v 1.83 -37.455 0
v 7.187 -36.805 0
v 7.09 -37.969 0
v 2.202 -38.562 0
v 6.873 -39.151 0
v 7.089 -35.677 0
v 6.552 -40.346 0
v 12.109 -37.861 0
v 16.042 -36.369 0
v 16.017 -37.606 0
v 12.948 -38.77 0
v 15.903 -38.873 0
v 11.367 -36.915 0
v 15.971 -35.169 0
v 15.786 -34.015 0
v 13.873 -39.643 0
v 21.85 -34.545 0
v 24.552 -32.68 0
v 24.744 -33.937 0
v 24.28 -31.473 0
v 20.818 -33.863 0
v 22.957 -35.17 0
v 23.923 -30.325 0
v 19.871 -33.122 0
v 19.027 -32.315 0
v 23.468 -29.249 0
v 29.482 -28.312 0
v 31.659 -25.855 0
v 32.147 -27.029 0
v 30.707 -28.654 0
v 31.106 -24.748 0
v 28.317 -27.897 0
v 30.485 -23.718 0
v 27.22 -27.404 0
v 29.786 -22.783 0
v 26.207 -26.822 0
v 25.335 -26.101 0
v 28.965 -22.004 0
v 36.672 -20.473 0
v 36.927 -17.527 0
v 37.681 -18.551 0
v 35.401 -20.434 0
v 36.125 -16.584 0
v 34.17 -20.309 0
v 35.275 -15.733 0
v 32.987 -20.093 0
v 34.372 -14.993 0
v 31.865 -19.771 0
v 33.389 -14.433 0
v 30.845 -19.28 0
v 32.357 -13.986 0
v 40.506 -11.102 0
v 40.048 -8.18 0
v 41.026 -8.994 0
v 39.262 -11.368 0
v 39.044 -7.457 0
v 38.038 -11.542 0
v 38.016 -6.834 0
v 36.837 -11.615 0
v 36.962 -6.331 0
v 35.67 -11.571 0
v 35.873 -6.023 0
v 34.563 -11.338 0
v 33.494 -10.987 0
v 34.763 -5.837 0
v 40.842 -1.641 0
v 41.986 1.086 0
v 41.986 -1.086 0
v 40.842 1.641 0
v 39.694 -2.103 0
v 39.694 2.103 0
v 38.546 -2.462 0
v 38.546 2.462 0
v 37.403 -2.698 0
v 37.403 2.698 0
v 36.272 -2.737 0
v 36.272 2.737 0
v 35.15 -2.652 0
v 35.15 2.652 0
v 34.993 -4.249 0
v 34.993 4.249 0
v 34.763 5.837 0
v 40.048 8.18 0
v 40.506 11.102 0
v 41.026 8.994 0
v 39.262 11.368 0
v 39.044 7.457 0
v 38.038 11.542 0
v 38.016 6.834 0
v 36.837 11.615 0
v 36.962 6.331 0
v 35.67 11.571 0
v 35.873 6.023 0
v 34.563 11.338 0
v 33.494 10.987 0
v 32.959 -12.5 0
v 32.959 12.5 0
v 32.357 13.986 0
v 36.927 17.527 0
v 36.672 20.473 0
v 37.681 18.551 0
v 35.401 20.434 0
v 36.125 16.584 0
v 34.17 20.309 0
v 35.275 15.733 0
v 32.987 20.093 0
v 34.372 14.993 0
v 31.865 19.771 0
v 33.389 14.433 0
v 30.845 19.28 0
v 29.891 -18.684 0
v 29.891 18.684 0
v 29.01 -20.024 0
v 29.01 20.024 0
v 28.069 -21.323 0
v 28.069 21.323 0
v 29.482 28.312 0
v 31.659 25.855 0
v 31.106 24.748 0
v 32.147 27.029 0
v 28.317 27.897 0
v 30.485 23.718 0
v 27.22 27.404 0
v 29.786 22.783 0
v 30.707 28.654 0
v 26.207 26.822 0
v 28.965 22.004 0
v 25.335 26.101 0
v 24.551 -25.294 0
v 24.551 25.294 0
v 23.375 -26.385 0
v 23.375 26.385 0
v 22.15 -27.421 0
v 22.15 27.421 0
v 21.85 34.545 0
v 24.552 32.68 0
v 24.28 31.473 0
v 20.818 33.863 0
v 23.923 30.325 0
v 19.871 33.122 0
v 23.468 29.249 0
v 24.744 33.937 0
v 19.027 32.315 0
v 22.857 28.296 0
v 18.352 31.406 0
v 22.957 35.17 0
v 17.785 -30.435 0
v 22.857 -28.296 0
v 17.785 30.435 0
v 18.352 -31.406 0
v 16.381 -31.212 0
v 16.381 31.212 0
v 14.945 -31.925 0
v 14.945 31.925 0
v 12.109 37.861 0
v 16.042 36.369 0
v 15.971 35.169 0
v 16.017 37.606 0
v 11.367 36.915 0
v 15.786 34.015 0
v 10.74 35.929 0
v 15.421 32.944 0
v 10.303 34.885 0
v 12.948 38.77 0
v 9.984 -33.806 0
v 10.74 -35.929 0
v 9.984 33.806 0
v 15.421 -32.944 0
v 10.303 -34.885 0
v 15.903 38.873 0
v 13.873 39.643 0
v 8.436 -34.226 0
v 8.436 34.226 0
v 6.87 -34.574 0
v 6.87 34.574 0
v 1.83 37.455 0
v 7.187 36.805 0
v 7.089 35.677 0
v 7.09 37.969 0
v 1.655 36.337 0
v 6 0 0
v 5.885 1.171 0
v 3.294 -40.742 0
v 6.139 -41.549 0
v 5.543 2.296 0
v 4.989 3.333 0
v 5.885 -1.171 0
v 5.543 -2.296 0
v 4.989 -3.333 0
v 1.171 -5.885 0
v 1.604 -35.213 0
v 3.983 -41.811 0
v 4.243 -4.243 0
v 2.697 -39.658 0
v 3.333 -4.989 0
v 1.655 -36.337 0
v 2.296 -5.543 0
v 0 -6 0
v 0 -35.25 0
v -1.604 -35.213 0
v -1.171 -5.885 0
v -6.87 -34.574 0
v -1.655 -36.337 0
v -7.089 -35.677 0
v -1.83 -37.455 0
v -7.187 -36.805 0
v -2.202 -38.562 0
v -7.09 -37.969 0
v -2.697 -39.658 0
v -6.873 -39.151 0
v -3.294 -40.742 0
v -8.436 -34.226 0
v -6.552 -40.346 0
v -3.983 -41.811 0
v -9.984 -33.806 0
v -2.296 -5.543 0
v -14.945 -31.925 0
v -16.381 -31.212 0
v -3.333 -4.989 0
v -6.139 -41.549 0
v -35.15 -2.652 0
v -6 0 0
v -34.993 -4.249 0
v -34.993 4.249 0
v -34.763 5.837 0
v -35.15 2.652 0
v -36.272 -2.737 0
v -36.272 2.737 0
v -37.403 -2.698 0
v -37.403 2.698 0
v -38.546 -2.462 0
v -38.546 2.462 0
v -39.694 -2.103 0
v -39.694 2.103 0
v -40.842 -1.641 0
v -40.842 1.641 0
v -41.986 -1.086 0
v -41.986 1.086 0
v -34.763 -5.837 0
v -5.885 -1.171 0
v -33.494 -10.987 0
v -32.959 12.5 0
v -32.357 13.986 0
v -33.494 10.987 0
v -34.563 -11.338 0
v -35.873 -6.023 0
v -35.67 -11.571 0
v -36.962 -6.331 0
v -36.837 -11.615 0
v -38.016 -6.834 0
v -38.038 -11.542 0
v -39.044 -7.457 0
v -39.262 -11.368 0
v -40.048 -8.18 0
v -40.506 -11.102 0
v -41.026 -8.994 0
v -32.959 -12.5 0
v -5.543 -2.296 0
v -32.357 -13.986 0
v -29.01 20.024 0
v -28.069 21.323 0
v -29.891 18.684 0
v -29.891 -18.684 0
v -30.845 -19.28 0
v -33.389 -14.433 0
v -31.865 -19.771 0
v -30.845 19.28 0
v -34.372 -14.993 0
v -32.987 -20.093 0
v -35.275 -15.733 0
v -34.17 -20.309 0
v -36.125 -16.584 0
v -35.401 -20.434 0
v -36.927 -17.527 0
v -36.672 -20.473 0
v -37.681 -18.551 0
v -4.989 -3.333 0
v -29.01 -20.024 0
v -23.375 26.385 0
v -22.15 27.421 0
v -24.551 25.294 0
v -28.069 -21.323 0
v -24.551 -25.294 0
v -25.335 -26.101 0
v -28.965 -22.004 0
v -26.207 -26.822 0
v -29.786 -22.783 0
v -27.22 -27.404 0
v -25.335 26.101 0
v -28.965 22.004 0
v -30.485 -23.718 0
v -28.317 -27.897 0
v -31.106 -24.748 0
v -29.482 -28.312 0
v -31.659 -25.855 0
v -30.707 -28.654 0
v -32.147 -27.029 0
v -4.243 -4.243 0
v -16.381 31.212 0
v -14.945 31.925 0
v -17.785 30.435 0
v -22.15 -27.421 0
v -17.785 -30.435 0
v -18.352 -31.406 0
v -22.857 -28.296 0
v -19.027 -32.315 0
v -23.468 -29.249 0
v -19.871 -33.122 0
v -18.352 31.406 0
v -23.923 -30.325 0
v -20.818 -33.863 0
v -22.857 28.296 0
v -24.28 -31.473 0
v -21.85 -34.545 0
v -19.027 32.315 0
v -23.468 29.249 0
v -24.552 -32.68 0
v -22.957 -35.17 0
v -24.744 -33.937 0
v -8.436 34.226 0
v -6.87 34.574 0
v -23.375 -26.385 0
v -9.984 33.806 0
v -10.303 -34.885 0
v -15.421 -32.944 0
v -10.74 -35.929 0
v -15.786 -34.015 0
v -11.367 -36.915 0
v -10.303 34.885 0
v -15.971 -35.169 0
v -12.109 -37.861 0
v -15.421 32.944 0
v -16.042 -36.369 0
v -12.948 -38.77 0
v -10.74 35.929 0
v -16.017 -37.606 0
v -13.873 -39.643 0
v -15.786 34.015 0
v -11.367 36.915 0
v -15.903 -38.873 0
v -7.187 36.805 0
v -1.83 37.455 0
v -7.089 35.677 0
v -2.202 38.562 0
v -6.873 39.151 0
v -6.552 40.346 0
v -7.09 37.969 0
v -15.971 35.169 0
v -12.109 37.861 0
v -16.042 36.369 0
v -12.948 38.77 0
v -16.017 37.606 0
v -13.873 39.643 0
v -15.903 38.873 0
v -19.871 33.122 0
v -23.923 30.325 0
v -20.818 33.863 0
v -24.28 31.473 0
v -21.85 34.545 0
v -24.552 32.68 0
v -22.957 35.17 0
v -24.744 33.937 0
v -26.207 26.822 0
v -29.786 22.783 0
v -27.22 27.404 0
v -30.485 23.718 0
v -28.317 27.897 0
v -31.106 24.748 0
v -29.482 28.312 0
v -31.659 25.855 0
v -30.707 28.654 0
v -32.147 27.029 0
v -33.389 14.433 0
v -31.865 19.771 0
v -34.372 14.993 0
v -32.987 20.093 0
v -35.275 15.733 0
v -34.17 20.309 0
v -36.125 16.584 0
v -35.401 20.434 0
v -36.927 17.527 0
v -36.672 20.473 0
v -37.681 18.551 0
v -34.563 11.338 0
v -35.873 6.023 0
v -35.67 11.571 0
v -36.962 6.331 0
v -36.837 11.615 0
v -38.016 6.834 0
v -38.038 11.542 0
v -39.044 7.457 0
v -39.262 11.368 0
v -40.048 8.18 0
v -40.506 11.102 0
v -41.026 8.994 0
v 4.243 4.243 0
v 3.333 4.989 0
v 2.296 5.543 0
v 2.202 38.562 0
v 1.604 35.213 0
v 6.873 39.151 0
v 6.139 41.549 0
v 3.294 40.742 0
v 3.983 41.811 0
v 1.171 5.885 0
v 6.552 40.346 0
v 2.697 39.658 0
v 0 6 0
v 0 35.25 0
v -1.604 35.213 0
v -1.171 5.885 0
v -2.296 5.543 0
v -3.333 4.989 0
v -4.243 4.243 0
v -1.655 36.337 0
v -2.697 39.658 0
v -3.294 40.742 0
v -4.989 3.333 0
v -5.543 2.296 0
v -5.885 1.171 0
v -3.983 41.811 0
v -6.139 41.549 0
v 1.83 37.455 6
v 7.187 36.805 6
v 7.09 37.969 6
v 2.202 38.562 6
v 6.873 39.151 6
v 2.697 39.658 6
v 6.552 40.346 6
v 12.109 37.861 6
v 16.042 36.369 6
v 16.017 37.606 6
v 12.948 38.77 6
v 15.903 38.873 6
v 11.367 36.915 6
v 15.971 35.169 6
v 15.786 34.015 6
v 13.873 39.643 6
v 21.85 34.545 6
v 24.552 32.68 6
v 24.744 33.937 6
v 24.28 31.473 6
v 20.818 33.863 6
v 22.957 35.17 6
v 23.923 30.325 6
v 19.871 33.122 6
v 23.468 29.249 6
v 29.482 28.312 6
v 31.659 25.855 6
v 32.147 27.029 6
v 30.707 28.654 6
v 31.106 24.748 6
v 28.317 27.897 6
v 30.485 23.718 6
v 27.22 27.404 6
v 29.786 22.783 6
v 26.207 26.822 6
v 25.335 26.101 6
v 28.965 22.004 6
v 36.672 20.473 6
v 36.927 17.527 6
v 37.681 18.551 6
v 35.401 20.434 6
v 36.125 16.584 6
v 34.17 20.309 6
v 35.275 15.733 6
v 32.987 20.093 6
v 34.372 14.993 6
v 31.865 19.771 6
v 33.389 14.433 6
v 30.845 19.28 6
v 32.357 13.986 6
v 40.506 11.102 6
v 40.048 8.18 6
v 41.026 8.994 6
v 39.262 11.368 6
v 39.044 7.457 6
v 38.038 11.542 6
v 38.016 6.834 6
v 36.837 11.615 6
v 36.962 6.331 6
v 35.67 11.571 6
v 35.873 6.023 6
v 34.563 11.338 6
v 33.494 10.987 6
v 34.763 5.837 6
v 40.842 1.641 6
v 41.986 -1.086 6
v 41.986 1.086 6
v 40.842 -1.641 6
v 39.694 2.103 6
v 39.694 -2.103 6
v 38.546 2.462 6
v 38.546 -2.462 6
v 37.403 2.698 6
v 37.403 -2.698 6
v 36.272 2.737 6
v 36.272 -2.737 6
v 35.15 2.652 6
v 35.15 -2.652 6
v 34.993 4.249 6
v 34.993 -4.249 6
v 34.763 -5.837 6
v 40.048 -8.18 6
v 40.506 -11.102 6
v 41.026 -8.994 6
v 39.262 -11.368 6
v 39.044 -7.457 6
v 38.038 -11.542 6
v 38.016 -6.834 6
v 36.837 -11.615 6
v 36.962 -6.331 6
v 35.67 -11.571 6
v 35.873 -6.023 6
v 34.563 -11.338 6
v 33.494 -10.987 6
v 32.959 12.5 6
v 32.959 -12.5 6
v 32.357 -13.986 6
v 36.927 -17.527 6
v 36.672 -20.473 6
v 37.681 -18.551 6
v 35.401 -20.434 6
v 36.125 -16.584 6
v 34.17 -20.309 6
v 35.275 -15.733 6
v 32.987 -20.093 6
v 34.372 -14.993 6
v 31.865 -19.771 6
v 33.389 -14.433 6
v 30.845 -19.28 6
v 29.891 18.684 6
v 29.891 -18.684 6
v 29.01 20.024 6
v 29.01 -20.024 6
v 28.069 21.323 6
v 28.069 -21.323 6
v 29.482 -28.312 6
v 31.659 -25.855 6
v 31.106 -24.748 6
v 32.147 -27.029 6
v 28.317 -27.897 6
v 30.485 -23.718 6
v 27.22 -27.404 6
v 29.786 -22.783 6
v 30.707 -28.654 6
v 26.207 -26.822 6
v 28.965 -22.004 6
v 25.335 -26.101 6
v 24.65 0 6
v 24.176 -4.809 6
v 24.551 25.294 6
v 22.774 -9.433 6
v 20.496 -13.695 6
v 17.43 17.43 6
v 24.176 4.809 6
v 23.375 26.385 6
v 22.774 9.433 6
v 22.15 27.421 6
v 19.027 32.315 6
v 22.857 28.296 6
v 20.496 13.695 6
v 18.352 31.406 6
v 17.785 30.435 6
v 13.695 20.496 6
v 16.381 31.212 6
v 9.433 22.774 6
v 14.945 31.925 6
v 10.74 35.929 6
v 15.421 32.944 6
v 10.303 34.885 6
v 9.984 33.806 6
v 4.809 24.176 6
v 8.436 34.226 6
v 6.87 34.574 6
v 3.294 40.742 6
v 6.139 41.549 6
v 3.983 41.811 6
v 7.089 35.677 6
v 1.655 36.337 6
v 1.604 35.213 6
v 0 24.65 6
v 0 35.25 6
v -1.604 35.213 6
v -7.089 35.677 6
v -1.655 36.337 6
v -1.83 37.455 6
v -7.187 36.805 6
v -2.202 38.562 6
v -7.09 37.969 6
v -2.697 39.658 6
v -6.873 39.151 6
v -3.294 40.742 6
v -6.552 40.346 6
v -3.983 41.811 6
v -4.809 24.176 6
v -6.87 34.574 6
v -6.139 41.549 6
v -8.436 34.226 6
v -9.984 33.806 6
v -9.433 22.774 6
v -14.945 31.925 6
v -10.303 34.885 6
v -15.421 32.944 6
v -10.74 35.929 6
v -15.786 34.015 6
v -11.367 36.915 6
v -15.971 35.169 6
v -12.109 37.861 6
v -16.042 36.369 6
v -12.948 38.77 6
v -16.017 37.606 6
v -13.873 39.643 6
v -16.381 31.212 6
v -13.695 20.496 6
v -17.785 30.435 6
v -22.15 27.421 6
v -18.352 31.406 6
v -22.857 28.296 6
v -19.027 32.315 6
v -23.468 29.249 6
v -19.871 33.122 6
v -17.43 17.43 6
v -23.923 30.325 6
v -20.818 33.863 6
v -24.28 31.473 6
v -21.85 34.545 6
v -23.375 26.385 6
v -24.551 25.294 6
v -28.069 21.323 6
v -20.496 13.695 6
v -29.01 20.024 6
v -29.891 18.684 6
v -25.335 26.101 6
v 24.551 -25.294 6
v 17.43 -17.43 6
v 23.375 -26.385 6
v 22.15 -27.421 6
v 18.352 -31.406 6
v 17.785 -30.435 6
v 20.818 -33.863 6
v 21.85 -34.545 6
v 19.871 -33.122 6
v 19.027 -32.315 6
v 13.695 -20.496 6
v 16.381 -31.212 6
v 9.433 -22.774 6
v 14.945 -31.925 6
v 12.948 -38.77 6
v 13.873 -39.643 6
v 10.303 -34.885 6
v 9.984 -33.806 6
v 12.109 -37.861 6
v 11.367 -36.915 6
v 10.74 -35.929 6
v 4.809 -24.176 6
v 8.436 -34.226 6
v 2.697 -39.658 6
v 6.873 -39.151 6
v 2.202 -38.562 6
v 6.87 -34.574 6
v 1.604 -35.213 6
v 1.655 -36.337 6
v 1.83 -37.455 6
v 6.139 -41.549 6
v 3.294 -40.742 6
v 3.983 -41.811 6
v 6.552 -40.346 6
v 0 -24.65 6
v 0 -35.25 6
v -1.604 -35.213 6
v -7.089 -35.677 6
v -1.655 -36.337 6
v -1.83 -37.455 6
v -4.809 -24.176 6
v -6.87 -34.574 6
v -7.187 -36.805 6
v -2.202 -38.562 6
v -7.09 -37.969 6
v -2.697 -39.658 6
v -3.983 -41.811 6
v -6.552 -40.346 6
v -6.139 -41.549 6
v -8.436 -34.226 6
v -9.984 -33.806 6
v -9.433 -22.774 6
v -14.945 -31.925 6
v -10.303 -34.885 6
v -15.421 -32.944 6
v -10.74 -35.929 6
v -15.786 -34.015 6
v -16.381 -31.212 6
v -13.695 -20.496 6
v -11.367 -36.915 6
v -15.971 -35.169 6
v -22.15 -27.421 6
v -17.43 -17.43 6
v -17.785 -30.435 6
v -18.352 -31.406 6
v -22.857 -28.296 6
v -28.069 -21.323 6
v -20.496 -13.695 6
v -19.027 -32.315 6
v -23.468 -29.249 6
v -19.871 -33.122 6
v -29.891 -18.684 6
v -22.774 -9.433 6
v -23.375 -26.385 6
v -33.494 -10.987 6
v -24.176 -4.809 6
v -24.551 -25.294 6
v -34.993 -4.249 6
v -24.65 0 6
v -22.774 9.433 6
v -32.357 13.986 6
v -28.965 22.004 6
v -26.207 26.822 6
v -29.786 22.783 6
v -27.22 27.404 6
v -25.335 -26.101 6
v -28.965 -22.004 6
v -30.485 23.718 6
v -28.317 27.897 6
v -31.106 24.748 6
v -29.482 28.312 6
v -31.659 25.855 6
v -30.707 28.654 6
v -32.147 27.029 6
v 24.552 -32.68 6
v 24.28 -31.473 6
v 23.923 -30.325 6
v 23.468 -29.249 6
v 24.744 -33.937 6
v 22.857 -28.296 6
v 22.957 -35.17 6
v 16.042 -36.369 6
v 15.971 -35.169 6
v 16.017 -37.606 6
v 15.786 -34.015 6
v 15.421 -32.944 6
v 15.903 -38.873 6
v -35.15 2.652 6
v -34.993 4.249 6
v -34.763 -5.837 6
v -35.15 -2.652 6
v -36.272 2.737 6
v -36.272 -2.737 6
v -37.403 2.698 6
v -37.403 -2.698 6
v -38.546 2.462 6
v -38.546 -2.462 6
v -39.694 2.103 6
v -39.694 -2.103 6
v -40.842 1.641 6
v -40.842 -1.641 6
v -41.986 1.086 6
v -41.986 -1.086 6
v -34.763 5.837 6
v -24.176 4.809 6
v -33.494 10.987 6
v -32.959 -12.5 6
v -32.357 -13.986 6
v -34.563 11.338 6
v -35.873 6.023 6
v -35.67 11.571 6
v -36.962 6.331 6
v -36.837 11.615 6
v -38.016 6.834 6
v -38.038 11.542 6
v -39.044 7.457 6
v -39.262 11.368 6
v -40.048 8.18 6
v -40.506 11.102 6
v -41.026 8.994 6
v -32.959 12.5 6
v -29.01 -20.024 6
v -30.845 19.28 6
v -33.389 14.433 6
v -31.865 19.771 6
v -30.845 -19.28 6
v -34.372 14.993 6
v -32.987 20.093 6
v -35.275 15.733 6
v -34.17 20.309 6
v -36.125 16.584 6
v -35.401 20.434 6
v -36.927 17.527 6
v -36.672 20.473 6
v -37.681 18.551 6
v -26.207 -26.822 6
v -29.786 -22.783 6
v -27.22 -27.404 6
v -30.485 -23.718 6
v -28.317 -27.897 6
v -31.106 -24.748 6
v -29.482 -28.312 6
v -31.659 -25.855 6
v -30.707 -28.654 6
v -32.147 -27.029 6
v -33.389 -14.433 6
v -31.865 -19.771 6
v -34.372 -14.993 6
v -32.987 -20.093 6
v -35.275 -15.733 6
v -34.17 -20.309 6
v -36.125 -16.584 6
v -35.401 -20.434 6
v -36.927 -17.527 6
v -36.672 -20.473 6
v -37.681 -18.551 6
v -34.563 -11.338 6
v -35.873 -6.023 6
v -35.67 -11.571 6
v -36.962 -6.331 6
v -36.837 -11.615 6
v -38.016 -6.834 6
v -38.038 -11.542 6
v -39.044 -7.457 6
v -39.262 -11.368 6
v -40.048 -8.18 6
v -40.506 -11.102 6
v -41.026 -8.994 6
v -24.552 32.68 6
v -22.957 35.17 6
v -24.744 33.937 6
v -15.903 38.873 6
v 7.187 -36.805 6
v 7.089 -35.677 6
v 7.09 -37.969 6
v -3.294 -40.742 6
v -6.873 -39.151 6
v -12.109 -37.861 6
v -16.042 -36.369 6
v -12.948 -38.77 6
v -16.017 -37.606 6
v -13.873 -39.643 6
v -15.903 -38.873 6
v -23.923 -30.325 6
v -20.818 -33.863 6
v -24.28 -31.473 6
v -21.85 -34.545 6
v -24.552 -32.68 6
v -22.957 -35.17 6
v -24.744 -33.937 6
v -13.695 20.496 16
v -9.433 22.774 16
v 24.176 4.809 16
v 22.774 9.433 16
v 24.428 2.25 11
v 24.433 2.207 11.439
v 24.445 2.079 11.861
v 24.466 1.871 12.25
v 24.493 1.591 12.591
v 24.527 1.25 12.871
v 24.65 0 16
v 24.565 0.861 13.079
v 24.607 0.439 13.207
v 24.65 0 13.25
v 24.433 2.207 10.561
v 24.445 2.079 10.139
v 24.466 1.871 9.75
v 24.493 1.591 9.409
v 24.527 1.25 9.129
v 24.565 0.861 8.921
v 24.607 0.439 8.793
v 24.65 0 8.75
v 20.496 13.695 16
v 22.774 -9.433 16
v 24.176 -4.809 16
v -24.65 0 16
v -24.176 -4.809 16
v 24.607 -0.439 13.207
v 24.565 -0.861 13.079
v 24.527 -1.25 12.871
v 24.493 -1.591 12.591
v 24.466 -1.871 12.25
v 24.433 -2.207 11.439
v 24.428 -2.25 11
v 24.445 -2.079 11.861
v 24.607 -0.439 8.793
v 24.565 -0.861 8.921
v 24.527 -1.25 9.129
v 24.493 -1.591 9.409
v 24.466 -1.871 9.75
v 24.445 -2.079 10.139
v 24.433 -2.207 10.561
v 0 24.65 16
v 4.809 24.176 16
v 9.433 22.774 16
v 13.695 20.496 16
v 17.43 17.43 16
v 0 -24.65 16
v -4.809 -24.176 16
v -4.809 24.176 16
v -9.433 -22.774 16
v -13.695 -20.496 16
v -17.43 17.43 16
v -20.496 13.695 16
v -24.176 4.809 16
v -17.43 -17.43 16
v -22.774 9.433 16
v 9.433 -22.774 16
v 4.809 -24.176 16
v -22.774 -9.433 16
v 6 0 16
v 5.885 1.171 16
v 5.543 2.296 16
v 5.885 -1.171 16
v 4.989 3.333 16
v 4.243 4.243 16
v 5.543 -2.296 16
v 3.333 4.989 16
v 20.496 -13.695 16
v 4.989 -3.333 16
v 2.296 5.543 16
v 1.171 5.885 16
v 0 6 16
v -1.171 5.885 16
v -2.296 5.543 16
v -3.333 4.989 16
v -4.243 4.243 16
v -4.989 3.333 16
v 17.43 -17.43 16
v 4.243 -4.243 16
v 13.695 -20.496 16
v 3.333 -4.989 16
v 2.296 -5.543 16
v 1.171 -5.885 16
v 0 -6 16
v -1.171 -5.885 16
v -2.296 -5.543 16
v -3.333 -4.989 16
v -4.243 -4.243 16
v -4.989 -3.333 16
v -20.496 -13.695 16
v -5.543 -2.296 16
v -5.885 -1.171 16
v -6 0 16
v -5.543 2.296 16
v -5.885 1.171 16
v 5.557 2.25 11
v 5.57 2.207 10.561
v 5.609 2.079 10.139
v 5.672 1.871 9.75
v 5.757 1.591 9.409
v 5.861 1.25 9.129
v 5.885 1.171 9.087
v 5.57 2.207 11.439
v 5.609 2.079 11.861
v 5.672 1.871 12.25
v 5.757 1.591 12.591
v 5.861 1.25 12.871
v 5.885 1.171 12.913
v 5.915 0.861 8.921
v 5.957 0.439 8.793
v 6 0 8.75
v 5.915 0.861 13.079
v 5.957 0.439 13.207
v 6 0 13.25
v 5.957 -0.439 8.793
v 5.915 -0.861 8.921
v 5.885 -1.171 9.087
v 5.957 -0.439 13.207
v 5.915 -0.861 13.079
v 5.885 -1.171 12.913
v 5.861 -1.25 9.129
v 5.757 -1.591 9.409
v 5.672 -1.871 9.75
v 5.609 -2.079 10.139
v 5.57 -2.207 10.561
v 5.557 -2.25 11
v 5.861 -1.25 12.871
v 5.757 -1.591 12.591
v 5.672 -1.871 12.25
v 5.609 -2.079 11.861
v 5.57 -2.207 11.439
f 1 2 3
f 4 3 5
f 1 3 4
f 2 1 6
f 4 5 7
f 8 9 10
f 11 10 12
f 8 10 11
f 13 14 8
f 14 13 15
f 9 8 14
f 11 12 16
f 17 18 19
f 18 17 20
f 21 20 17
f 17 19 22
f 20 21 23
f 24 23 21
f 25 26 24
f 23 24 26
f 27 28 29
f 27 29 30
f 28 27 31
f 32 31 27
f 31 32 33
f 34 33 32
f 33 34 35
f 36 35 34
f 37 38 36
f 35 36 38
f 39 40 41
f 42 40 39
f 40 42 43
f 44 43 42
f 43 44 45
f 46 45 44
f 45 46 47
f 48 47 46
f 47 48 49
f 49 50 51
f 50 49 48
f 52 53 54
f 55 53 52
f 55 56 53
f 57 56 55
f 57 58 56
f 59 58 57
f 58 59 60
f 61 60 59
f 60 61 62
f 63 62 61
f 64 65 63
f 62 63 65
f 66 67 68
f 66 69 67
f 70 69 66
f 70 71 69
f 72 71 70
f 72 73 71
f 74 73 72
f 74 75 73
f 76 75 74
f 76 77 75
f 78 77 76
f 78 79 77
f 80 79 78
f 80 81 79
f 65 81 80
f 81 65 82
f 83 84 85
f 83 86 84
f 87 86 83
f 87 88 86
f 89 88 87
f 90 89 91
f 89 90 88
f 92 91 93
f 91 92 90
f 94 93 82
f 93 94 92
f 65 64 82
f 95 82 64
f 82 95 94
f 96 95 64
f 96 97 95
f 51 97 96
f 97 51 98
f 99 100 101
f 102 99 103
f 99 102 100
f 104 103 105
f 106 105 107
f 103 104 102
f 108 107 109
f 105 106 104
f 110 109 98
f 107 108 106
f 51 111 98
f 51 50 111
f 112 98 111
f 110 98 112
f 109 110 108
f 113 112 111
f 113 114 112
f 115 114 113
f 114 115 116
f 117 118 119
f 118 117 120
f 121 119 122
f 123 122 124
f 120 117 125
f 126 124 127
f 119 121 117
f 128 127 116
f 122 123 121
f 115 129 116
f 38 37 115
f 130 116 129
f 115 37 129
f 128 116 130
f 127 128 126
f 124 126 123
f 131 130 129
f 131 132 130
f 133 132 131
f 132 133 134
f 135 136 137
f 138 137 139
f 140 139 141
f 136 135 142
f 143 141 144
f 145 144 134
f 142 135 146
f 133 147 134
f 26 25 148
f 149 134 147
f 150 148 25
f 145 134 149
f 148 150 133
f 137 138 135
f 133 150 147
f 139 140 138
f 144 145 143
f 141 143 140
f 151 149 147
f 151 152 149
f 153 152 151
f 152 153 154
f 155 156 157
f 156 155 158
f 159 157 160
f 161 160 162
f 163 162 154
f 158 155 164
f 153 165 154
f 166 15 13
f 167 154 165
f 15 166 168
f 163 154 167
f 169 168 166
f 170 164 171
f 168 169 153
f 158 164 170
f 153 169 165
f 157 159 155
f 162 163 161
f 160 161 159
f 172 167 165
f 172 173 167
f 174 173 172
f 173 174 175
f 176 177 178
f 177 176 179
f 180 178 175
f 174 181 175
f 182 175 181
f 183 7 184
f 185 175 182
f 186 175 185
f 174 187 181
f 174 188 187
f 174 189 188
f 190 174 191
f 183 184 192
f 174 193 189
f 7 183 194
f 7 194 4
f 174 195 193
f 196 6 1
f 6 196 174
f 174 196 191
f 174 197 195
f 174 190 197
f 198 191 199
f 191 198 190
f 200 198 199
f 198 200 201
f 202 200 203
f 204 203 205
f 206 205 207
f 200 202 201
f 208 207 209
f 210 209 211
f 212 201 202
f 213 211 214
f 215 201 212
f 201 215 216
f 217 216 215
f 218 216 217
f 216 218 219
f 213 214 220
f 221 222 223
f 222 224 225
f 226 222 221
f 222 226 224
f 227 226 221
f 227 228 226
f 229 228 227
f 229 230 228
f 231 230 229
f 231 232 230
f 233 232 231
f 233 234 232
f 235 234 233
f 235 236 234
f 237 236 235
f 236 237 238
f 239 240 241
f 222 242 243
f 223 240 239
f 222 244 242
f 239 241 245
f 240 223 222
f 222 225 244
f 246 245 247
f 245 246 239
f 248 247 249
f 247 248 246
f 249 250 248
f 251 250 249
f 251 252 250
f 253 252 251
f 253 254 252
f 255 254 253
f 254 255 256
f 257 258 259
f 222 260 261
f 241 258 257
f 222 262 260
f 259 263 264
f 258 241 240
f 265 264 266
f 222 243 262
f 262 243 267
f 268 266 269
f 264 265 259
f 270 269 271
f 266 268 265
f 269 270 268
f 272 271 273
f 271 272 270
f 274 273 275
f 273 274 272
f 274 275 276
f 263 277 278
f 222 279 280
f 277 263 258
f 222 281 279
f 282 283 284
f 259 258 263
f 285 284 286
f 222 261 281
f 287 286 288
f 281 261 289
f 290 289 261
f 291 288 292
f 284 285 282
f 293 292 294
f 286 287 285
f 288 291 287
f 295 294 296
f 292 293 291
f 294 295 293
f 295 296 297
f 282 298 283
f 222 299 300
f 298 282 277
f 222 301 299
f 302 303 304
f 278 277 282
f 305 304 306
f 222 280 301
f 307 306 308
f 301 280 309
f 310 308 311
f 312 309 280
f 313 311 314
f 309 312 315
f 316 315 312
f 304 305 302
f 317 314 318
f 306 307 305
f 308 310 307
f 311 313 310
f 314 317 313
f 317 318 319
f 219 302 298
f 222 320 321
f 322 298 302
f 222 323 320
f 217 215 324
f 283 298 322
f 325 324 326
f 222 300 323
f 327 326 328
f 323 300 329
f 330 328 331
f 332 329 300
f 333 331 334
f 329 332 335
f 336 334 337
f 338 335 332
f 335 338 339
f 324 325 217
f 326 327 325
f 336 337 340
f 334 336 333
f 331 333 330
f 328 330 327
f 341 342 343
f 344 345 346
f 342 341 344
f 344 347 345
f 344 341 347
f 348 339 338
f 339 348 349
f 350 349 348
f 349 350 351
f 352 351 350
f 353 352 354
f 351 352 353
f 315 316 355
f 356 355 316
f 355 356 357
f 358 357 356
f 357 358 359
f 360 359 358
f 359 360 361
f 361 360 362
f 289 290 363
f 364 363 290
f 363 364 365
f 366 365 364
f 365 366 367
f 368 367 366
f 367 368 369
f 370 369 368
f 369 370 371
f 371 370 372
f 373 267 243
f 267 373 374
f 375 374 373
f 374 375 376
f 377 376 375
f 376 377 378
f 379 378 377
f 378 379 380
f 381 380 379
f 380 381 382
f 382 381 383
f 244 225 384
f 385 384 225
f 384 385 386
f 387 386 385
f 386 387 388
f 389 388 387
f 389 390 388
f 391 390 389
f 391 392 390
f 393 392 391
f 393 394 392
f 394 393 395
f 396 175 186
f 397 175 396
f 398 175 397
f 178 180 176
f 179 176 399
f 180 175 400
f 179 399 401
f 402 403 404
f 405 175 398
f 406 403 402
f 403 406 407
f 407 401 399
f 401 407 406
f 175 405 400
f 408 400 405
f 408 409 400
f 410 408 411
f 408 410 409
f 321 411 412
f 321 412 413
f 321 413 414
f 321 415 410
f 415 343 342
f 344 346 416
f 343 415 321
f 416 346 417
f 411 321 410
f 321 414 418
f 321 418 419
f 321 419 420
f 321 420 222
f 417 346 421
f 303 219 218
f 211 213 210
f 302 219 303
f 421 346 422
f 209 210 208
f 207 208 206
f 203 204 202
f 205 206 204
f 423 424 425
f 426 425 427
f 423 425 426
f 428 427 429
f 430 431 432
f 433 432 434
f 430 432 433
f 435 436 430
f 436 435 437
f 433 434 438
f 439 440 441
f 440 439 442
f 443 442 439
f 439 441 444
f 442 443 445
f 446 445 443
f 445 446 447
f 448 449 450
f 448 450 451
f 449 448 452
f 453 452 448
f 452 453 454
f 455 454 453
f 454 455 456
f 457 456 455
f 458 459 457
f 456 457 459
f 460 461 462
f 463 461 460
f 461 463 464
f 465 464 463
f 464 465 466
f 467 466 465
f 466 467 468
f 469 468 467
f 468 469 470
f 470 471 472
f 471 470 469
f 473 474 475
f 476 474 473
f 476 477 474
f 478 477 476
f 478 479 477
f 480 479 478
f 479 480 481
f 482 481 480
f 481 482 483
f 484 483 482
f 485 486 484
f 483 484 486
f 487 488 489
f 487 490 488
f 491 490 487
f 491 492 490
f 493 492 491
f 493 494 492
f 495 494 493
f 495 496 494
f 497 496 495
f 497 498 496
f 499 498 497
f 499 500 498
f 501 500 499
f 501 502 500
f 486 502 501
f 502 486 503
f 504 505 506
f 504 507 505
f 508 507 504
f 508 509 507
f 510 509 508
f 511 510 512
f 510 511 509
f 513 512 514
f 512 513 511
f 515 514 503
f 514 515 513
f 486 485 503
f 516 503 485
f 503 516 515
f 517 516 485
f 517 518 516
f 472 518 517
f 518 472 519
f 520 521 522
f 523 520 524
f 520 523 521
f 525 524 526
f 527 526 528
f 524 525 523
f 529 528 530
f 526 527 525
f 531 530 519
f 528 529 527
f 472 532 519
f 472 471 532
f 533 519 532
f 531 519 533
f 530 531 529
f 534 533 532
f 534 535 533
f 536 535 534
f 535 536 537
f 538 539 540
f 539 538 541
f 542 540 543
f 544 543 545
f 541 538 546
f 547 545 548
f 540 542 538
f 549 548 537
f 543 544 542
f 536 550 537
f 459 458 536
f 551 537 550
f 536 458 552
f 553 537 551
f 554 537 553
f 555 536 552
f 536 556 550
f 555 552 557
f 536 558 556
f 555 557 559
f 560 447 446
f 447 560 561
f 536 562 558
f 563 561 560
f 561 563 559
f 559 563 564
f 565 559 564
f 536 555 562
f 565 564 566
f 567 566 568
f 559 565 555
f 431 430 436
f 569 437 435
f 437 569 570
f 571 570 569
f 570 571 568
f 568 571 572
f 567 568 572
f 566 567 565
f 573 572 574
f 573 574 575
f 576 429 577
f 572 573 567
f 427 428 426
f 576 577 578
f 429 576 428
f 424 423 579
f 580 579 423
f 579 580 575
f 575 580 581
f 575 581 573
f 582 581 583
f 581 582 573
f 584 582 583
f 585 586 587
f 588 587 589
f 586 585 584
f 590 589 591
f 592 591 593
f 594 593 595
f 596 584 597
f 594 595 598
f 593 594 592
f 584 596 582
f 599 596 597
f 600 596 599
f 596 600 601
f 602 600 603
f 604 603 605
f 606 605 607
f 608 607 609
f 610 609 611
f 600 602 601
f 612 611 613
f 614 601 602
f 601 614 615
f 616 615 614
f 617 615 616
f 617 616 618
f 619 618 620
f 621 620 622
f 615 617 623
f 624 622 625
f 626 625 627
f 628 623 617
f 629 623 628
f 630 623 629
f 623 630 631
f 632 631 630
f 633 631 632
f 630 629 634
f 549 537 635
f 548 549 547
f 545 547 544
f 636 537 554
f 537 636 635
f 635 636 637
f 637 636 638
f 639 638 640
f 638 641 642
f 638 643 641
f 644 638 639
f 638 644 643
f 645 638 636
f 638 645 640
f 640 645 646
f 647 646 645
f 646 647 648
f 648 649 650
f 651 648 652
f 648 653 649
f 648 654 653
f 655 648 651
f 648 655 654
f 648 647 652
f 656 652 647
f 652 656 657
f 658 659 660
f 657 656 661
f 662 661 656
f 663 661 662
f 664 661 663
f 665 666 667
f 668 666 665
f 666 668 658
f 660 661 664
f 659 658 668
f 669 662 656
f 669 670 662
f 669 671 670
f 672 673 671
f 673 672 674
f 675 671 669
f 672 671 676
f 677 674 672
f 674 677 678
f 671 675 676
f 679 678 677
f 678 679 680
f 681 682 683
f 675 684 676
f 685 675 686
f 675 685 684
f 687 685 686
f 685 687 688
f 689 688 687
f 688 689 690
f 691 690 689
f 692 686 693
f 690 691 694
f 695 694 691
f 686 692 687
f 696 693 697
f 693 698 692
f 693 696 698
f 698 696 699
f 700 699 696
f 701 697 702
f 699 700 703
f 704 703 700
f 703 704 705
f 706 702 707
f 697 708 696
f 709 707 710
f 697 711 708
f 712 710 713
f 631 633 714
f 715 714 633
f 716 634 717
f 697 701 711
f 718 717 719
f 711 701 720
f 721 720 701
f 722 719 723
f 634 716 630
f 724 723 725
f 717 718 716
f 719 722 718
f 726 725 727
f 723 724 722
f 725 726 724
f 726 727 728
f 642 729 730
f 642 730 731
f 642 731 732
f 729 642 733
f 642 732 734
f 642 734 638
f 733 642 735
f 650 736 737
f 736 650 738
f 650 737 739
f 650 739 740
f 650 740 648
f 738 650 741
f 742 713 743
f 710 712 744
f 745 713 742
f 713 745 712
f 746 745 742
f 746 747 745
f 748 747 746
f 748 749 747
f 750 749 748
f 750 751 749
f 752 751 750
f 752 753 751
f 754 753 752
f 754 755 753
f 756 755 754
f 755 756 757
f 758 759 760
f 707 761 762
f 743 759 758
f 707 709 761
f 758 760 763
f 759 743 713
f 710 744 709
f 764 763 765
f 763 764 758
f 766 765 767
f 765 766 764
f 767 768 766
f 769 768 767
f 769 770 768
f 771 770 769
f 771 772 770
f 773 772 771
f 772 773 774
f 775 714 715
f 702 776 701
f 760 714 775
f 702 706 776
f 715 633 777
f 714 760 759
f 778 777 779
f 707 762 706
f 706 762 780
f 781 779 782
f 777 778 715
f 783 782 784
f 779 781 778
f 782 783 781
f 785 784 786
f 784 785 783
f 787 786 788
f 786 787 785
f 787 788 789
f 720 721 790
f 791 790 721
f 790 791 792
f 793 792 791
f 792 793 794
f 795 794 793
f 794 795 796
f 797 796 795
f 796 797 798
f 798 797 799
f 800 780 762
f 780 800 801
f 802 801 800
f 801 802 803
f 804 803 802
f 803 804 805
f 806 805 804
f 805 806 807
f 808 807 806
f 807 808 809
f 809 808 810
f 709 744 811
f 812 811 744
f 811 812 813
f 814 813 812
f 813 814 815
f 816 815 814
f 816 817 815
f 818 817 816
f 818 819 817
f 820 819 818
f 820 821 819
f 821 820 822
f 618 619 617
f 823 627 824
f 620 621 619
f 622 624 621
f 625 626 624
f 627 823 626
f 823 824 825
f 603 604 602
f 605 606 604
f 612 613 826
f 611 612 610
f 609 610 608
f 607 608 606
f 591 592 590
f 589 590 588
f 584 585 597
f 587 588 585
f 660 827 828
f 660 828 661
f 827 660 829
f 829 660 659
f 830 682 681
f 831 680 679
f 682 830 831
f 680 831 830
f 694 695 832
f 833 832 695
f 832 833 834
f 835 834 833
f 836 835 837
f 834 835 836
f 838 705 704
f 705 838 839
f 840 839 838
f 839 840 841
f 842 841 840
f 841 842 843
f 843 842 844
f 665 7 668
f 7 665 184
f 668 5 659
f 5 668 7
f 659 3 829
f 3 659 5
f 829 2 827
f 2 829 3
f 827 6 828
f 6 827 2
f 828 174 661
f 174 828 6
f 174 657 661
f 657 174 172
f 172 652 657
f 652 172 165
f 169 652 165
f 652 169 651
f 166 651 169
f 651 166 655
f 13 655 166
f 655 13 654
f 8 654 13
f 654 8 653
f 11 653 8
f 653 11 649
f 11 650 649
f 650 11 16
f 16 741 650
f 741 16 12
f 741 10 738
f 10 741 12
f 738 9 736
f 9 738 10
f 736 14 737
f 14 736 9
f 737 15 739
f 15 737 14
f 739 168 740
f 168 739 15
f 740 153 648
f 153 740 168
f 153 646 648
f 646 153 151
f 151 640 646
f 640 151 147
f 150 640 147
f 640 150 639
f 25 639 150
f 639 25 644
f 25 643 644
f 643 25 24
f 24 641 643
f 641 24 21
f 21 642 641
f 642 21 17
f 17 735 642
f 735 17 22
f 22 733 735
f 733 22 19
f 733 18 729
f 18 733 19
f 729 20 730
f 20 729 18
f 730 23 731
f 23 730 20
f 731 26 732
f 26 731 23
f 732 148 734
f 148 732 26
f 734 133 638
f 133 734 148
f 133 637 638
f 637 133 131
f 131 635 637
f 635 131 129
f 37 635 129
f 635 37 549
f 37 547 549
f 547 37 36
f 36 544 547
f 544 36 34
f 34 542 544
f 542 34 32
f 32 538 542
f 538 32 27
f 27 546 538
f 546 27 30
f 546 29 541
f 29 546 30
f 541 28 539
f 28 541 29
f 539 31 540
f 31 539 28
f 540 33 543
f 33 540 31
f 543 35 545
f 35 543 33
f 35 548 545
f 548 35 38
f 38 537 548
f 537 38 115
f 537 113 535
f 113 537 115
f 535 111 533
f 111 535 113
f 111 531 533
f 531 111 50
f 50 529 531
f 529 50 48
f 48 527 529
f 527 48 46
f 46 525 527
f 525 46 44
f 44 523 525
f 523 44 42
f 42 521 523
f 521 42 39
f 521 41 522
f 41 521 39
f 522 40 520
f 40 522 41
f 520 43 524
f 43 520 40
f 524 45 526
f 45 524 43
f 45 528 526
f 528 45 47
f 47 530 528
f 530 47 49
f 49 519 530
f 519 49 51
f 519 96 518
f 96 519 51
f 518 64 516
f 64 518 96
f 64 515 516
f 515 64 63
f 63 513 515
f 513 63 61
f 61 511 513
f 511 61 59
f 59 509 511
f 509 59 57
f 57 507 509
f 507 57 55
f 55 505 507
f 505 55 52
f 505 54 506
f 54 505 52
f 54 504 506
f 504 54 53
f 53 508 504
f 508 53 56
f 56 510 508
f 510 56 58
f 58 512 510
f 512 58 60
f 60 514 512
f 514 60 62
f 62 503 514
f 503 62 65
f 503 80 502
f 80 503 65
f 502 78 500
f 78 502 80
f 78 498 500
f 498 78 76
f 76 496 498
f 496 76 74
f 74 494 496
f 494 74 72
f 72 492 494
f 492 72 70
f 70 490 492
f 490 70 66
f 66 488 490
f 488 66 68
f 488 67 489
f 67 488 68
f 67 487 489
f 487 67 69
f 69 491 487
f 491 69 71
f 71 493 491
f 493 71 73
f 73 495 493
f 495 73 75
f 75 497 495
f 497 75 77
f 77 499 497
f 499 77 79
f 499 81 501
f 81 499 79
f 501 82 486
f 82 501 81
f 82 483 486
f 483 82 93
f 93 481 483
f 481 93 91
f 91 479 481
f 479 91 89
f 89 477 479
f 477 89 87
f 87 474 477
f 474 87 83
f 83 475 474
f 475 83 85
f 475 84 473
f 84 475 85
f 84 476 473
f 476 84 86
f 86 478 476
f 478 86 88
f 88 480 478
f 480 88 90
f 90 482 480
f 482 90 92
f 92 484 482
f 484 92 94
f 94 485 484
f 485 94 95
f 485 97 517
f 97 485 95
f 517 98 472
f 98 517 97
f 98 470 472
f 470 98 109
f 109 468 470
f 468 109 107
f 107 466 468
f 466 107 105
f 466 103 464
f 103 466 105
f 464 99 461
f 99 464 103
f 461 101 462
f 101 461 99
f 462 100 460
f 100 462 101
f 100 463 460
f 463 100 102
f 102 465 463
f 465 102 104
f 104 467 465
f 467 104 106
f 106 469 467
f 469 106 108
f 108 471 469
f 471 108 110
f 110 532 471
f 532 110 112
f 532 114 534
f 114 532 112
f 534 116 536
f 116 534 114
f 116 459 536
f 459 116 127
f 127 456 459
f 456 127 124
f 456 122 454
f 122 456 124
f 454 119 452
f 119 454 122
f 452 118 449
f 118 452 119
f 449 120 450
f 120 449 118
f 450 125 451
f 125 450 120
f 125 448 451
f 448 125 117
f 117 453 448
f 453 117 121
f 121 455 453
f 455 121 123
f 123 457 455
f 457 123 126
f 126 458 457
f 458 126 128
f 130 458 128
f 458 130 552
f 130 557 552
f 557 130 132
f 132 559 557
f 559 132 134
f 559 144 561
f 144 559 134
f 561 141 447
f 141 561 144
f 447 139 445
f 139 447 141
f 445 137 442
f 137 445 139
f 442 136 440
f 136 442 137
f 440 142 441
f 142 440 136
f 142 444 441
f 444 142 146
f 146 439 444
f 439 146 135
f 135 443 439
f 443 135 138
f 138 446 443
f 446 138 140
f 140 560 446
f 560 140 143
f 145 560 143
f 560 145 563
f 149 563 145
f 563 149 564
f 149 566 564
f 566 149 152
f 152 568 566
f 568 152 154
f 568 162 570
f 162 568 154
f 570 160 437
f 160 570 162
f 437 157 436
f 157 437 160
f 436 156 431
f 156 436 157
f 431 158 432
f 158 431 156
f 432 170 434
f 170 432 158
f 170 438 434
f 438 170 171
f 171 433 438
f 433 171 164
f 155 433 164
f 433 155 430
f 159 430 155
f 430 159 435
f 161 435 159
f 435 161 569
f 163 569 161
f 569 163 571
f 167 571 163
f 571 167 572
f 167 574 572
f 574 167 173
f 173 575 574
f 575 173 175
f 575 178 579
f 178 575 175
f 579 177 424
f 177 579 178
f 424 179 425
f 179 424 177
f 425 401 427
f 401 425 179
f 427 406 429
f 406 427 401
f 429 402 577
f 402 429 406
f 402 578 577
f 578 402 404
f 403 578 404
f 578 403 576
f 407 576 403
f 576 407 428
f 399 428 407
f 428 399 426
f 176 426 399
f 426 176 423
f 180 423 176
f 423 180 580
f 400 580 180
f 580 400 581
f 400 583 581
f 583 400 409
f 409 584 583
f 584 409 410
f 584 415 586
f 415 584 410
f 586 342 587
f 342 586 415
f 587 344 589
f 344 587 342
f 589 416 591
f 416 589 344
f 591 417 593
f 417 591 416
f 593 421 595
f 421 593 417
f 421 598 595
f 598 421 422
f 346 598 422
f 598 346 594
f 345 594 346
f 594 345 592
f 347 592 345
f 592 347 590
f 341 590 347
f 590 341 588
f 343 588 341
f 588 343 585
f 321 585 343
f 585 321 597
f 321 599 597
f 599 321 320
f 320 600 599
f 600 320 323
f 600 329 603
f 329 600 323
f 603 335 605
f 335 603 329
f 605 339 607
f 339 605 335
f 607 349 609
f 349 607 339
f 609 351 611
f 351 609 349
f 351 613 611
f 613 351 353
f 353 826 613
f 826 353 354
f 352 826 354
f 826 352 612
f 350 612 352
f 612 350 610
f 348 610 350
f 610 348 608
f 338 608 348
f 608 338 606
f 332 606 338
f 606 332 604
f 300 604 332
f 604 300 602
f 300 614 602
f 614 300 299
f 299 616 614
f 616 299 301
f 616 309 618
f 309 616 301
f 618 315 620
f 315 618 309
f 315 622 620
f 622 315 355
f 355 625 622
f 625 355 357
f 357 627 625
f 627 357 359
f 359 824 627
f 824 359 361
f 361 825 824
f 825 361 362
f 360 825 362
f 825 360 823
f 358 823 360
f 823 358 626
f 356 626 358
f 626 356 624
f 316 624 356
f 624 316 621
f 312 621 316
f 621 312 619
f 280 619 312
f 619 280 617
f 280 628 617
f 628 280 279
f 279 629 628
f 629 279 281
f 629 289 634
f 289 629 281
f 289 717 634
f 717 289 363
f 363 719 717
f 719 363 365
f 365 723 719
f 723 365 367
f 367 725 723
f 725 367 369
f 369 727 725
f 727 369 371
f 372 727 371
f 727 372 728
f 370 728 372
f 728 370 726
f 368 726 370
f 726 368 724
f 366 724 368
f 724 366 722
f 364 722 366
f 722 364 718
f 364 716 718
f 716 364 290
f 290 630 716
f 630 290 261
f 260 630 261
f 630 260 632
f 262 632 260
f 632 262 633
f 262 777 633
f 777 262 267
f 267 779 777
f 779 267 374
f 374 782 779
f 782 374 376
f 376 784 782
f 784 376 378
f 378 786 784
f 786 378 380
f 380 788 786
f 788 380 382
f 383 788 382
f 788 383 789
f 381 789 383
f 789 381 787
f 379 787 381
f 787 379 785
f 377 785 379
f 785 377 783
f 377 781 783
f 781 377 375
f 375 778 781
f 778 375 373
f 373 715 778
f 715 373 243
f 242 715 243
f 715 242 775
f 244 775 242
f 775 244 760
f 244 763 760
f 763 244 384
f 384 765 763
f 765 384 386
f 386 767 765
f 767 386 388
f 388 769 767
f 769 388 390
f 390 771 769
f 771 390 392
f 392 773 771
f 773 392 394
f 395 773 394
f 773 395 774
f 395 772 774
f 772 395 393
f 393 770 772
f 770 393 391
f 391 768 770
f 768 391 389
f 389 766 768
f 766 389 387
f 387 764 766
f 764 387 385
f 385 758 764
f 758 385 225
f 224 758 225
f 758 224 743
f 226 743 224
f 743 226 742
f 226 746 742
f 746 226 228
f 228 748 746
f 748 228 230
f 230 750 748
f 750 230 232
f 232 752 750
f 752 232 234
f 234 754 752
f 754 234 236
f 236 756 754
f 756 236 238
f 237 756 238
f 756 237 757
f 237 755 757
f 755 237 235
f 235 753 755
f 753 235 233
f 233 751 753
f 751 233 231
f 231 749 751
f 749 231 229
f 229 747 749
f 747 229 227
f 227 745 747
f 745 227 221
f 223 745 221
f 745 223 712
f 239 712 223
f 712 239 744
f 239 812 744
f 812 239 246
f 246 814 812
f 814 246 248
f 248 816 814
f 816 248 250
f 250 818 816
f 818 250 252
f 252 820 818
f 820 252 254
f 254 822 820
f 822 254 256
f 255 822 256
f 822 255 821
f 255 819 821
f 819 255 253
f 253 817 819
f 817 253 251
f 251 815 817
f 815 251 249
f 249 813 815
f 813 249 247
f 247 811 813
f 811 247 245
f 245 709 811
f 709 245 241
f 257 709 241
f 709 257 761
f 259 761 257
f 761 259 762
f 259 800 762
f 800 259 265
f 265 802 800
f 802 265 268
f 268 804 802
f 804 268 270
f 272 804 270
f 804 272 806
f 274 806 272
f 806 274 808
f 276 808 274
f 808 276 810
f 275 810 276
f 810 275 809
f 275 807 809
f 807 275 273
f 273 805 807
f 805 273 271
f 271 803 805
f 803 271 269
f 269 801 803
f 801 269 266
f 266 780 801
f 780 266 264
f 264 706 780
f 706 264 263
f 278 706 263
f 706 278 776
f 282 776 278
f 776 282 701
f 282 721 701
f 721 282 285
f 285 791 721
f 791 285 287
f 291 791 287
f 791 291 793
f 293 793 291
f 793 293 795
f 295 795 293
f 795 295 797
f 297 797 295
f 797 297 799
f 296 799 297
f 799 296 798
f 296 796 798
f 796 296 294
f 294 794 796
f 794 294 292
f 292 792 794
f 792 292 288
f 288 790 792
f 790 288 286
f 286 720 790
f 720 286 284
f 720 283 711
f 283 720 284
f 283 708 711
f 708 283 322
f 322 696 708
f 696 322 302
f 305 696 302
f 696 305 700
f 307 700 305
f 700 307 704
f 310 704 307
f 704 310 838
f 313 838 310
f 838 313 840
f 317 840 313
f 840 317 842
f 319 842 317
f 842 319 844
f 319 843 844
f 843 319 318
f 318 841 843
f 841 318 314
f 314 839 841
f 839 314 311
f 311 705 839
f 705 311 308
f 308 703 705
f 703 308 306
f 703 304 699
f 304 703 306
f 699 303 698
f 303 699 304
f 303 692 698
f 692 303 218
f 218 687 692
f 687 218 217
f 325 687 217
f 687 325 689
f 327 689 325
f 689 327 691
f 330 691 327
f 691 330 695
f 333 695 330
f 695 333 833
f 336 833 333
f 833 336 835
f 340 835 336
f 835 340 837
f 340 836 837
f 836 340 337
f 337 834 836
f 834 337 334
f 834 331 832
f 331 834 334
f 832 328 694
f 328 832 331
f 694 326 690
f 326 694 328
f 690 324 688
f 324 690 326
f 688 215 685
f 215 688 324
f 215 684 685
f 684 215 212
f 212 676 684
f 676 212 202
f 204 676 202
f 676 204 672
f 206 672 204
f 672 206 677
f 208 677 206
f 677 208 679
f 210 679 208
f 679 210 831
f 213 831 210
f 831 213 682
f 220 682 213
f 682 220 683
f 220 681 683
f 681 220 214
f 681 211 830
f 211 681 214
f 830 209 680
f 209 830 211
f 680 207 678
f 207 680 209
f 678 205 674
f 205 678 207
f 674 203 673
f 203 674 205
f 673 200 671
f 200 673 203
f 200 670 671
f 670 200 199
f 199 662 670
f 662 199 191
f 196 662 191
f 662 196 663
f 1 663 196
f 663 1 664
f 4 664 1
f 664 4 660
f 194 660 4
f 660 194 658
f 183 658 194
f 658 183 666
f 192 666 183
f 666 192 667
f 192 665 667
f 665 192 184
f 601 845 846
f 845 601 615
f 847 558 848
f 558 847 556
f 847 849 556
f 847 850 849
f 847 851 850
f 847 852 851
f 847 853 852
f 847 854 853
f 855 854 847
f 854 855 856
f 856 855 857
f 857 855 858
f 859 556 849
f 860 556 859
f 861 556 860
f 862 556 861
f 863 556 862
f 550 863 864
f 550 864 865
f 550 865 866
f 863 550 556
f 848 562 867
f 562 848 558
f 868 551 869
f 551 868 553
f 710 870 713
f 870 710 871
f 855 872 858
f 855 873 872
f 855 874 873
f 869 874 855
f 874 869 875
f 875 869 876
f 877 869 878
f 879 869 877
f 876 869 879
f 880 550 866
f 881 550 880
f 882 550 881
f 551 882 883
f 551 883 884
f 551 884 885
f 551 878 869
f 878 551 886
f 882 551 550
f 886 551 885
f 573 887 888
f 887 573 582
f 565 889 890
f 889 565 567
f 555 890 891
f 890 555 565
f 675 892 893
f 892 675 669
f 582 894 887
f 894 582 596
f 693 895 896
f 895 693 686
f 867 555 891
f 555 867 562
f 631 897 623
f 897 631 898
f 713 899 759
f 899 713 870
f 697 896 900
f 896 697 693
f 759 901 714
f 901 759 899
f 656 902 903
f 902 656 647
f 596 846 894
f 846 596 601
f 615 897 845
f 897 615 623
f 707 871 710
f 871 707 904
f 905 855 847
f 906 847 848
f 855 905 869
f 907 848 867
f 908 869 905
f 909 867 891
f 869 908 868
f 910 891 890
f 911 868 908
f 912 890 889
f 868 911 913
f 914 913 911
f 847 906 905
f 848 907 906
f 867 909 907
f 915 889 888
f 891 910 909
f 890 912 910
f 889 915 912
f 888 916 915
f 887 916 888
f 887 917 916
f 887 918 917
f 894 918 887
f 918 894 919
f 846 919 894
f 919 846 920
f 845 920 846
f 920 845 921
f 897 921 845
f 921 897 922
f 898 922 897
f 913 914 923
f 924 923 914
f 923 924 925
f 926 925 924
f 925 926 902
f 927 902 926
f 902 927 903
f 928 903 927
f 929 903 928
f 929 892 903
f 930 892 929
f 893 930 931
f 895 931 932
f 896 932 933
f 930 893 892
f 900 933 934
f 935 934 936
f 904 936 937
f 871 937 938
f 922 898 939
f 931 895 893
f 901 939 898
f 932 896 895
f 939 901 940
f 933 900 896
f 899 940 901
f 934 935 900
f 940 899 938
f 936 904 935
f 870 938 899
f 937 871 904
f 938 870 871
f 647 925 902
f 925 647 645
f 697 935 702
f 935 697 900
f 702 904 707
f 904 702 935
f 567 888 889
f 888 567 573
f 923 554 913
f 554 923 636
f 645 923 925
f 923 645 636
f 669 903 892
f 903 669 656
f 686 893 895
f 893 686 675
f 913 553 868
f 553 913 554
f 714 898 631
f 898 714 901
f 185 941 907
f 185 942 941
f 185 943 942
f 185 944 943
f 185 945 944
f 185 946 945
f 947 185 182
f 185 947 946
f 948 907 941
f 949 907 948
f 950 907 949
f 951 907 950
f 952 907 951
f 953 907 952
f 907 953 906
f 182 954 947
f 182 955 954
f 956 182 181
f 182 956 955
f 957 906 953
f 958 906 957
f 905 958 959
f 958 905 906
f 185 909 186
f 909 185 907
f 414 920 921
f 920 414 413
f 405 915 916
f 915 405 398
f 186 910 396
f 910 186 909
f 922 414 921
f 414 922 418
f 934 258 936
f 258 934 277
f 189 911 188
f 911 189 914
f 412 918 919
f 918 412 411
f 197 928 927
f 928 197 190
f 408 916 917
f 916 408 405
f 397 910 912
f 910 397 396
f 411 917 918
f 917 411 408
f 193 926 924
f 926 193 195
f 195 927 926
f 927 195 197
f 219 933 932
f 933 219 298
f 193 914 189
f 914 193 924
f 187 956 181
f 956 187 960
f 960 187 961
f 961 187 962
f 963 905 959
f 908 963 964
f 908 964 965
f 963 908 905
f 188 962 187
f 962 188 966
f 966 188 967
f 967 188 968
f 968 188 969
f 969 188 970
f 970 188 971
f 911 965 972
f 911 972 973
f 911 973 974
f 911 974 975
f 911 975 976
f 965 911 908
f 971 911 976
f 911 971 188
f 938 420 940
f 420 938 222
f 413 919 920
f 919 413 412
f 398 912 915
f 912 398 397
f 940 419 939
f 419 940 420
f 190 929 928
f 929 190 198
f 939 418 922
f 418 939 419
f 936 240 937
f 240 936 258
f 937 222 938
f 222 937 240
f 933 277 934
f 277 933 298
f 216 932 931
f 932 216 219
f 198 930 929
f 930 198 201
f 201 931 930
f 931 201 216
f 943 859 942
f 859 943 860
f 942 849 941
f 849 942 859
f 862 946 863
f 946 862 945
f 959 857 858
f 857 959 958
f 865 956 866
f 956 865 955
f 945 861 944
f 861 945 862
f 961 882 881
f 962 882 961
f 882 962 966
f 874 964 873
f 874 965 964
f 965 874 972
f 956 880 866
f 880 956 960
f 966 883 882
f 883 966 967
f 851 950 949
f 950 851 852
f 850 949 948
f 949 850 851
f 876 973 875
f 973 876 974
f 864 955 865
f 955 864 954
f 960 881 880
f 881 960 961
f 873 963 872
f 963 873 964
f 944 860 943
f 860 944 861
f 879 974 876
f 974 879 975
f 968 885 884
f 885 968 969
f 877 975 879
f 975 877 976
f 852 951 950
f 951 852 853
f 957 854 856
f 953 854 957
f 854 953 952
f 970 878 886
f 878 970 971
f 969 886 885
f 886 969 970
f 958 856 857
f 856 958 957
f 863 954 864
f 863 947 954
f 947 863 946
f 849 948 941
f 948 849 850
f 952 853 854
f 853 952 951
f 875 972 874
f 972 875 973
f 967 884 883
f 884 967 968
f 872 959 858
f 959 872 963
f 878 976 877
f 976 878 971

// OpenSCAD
$fn = 32;

// ----------------------------------------------------------------------
// Spur gear: m=3 z=26, 84 mm tip diameter x 16 mm
// ----------------------------------------------------------------------

// --- parameters (mm) ---
gear_module = 3;          // module
tooth_count = 26;         // number of teeth
gear_w = 6;               // face width
pa = 20;                  // pressure angle, deg
bore = 12;                // shaft bore
hub_dia = 49.3;           // hub diameter
hub_len = 10;             // hub above the face
set_d = 4.5;              // set screw tap hole
set_z = 11;               // set screw height

/* --- involute profile --- */
pitch_r = gear_module * tooth_count / 2;
base_r = pitch_r * cos(pa);
tip_r = pitch_r + gear_module;
root_r = pitch_r - 1.25 * gear_module;
flank_steps = 6;

function inv_deg(a) = (tan(a) - a * PI / 180) * 180 / PI;
function flank_r(i) = root_r + (tip_r - root_r) * i / flank_steps;
function half_angle(r) = 90 / tooth_count + inv_deg(pa) - inv_deg(acos(min(1, base_r / r)));
function tooth_pt(k, i, side) =
    let (r = flank_r(i), a = k * 360 / tooth_count + side * half_angle(r))
    [r * cos(a), r * sin(a)];

module tooth_profile() {
  polygon(points = [
    for (k = [0 : tooth_count - 1])
      each [
        for (i = [0 : flank_steps]) tooth_pt(k, i, -1),
        for (i = [flank_steps : -1 : 0]) tooth_pt(k, i, 1),
        let (ta = (k + 0.5) * 360 / tooth_count)
          [root_r * cos(ta), root_r * sin(ta)]
      ]
  ]);
}

module gear_disc() {
  linear_extrude(height = gear_w) tooth_profile();
}

module hub_boss() {
  translate([0, 0, gear_w - 1]) cylinder(h = hub_len + 1, d = hub_dia);
}

difference() {
  union() {
    gear_disc();
    hub_boss();
  }
  translate([0, 0, -1]) cylinder(h = gear_w + hub_len + 3, d = bore);
  /* set screw, drilled radially */
  translate([-1, 0, set_z]) rotate([0, 90, 0]) cylinder(h = hub_dia / 2 + 3, d = set_d);
}
